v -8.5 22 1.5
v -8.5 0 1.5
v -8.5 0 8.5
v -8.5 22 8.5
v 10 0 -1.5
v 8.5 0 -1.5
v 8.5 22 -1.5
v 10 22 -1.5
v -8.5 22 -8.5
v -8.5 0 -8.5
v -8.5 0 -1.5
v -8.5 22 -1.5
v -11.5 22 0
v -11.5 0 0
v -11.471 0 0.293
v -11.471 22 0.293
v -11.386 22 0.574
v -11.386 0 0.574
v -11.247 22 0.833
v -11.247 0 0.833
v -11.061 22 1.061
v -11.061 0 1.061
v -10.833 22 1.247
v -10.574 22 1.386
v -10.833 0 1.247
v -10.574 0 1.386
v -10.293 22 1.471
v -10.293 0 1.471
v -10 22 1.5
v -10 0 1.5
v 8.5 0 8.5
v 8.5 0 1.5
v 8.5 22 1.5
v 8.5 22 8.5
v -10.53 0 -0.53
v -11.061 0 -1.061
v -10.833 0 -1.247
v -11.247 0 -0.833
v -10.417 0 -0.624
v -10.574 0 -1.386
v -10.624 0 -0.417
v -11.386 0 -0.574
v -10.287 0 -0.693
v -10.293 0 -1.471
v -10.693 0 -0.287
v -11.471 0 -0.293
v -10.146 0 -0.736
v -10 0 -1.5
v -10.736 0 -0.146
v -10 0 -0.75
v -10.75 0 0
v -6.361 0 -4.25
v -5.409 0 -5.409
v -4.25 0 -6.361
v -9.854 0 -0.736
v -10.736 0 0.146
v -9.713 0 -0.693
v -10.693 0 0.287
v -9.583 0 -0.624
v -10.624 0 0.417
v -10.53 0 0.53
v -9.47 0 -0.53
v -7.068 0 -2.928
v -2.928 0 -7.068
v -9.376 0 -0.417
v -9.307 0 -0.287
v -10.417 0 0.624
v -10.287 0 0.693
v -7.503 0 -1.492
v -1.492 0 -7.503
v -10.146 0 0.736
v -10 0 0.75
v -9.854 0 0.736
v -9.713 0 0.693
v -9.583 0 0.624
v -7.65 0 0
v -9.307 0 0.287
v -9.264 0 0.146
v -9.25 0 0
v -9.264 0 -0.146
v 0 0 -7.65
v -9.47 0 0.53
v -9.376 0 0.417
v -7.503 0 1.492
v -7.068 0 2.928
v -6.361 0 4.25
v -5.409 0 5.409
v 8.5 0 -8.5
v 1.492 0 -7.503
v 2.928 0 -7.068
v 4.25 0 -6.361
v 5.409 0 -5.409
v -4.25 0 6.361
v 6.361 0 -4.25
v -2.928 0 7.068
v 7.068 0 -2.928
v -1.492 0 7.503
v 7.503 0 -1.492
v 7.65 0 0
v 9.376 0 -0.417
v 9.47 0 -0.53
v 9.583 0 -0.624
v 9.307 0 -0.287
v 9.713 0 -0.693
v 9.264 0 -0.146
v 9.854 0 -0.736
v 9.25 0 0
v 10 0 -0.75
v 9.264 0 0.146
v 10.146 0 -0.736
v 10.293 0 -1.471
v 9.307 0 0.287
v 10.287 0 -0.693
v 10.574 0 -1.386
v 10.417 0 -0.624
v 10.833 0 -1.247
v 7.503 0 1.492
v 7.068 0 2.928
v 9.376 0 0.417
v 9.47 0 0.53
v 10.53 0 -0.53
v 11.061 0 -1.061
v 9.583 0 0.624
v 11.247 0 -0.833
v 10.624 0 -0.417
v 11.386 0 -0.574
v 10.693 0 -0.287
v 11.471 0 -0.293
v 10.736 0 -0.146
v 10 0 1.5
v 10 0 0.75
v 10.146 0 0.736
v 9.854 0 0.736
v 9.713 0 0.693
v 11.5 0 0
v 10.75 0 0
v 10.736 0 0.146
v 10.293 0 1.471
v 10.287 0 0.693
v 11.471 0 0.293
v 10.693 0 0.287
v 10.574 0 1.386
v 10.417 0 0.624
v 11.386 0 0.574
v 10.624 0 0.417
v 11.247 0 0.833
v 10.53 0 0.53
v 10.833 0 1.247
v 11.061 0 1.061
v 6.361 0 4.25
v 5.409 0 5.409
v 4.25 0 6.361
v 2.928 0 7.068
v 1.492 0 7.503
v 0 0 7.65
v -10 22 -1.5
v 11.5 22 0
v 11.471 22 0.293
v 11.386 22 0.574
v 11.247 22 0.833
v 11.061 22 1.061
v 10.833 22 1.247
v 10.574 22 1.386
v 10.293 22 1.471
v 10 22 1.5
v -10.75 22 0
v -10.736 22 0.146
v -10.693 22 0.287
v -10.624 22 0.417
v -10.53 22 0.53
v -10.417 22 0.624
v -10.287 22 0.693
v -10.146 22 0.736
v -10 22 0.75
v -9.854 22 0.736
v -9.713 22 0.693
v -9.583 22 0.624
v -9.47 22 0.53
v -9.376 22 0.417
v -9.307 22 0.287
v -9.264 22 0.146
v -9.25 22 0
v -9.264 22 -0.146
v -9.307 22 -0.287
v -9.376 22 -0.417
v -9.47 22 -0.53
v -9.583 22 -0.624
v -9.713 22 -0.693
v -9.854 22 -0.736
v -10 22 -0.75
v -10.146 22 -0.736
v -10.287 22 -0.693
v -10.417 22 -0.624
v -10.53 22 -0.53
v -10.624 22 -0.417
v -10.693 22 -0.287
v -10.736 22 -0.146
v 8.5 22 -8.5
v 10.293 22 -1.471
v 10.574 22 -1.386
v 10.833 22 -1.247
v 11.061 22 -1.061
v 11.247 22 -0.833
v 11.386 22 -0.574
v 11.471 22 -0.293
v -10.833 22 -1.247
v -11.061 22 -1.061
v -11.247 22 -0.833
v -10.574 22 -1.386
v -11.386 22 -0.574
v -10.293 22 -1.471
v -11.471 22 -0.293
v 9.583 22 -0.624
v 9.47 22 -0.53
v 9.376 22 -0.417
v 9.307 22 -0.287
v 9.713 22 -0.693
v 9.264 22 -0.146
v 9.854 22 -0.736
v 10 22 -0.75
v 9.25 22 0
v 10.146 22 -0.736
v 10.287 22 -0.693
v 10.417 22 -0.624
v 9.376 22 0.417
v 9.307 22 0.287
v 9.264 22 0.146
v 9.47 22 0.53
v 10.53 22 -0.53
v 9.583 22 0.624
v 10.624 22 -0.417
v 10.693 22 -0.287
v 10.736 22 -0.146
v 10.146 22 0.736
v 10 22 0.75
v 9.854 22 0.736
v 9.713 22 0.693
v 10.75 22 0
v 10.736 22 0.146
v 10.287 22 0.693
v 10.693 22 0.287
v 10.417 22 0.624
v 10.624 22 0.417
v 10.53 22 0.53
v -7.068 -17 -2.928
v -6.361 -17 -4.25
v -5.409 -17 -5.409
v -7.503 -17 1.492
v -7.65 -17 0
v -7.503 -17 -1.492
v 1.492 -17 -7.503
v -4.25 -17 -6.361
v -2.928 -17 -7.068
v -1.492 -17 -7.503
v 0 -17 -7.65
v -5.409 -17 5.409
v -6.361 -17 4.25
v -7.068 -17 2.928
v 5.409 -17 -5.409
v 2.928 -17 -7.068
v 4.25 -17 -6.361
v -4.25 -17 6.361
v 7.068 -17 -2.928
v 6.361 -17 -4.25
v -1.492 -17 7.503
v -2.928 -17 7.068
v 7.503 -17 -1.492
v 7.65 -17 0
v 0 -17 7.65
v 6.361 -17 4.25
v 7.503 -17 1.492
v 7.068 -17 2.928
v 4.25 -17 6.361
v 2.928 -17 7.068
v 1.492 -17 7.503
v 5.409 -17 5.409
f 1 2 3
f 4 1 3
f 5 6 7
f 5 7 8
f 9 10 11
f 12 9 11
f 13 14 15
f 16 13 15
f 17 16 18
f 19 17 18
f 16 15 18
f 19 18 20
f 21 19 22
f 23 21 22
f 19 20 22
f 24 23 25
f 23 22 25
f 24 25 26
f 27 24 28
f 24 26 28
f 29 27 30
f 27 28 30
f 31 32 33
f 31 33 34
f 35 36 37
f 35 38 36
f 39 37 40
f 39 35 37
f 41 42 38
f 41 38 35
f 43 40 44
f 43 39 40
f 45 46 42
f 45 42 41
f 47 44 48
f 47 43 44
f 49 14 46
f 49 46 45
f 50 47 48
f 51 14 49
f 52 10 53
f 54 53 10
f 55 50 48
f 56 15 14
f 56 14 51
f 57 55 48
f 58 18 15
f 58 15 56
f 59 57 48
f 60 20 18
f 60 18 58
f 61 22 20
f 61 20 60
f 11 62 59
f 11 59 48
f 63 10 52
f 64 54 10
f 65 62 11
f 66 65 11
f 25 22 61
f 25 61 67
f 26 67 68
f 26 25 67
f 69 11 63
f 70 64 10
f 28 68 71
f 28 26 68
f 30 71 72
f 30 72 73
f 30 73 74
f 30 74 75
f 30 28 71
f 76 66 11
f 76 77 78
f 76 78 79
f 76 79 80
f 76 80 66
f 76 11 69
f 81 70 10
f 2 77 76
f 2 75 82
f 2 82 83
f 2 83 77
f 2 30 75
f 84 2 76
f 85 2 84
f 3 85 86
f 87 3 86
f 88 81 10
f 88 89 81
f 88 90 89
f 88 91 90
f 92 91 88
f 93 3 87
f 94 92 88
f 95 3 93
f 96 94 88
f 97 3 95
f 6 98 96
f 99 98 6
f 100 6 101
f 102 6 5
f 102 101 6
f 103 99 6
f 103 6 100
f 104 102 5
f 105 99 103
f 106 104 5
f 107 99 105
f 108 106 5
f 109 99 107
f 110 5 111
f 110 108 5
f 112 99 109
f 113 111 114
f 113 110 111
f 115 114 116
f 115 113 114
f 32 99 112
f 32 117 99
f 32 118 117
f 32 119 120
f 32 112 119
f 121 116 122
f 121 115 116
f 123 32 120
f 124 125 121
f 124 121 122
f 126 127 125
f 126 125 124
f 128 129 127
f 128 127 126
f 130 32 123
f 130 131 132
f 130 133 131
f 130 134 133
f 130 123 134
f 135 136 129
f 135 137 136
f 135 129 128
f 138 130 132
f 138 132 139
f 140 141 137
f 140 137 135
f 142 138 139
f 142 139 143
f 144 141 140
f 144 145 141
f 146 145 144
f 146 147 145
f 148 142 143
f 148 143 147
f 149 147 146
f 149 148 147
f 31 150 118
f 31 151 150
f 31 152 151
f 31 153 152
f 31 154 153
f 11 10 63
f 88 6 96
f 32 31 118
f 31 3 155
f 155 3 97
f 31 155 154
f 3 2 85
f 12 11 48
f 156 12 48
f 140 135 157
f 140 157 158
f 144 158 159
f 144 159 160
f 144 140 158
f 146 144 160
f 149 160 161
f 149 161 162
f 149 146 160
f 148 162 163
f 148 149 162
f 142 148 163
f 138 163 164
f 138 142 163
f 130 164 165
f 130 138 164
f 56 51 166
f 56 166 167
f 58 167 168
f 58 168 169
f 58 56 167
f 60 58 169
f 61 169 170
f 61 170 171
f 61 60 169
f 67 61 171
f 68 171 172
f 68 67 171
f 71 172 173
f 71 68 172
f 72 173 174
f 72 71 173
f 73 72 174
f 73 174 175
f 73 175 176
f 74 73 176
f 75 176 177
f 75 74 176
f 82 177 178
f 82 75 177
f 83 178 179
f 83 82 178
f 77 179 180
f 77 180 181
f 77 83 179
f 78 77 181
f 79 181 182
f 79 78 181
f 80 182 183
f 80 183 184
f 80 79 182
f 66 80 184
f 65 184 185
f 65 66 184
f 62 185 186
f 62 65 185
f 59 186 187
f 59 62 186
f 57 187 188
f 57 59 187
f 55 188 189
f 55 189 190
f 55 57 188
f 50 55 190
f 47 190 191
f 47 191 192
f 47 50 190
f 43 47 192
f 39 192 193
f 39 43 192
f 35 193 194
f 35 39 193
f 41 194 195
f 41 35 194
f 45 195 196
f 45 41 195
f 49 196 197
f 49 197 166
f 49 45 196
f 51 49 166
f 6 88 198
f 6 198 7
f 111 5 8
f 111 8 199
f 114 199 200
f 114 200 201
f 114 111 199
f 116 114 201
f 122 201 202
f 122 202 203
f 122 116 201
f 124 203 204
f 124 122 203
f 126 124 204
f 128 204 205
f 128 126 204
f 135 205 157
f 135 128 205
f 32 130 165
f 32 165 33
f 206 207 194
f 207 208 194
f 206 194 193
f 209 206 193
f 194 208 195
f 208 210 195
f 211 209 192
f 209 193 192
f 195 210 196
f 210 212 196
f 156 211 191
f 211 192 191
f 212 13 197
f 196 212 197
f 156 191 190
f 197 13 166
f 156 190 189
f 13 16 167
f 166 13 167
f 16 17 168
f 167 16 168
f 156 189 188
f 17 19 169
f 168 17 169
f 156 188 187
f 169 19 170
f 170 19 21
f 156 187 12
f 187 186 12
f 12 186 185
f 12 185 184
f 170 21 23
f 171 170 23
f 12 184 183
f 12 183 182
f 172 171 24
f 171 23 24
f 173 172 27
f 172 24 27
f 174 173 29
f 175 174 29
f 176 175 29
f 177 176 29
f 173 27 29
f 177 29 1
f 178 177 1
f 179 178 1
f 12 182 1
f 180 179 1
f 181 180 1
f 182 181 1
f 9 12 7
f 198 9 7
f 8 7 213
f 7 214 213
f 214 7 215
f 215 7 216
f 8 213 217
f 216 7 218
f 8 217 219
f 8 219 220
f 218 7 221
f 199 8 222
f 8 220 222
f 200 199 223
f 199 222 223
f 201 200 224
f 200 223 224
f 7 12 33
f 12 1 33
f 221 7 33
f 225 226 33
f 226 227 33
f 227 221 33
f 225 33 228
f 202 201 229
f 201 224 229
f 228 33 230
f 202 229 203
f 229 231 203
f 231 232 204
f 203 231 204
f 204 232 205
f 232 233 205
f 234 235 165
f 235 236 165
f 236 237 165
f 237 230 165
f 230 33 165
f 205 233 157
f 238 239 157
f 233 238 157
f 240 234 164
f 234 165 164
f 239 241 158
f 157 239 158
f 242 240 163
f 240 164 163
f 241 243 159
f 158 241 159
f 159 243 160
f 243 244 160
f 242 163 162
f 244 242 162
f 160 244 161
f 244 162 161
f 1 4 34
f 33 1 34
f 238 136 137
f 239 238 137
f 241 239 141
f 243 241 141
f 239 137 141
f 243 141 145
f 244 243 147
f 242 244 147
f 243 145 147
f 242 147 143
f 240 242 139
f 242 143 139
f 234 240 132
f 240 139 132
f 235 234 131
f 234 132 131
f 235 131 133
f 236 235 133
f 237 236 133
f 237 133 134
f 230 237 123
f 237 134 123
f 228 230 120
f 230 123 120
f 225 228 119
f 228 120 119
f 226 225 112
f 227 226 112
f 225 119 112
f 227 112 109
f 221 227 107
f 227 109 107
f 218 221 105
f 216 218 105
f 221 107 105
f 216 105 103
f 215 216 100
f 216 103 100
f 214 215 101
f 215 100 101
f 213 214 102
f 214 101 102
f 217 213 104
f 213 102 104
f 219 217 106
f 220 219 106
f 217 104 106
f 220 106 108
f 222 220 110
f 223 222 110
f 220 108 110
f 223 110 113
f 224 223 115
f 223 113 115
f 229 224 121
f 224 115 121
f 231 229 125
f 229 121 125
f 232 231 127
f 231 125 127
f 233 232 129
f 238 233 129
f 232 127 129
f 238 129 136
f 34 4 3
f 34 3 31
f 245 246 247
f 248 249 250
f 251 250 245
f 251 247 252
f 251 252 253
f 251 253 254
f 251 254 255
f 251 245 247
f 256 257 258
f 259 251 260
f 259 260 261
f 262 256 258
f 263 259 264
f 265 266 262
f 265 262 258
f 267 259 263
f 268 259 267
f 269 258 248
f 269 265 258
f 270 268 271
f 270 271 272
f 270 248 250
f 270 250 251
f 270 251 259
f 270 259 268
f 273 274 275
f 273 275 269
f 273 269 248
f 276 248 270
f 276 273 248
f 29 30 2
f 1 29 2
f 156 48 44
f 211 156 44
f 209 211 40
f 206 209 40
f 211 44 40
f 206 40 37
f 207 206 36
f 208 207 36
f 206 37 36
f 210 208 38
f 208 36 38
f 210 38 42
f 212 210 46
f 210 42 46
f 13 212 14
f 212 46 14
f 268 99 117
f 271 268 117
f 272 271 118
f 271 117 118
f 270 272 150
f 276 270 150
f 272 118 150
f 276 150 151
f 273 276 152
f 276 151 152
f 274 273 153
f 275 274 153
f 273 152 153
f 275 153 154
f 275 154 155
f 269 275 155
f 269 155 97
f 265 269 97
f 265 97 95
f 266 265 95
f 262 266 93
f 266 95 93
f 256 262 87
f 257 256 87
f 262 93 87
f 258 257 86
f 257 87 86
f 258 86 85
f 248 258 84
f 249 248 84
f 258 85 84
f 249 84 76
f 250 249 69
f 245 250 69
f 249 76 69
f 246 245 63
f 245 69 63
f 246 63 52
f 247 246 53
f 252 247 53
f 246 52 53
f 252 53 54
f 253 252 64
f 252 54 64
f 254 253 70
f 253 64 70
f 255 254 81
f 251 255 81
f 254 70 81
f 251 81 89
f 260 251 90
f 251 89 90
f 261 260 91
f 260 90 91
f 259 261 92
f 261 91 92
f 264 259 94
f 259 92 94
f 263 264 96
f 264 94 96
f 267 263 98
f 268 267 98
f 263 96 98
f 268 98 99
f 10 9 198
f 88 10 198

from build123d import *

# Parameters (mm, degrees)
F0_R     = 7.65
F1_DEPTH = 17
F2_W     = 17
F2_H     = 17
F3_DEPTH = 22
F4_R     = 0.75
F5_DEPTH = 22


# Not quite as in the source:
# - a pattern or mirror of a feature is missing from the dataset's text; its kind, count and spacing are read off the source's solid


with BuildPart() as f1:
    # F0 (on Front) → F1 (new body)
    with BuildSketch(Plane.XZ):
        Circle(F0_R)
    extrude(amount=F1_DEPTH)

    # F2 (on Front) → F3 (join)
    with BuildSketch(Plane.XZ):
        Rectangle(F2_W, F2_H)
    extrude(amount=-F3_DEPTH)

    # F4 (on Front) → F5 (join)
    with BuildSketch(Plane.XZ):
        with BuildLine():
            ThreePointArc((10, -1.5), (11.0606601718, -1.0606601718), (11.5, 0))
            ThreePointArc((11.5, 0), (11.0606601718, 1.0606601718), (10, 1.5))
            ThreePointArc((10, 1.5), (8.9393398282, 1.0606601718), (8.5, 0))
            ThreePointArc((8.5, 0), (8.9393398282, -1.0606601718), (10, -1.5))
        make_face()
        with Locations((10, 0)):
            Circle(F4_R, mode=Mode.SUBTRACT)
        with BuildLine():
            ThreePointArc((8.5, 0), (8.9393398282, 1.0606601718), (10, 1.5))
            Line((10, 1.5), (8.5, 1.5))
            Line((8.5, 1.5), (8.5, 0))
        make_face()
        with BuildLine():
            Line((8.5, -1.5), (10, -1.5))
            ThreePointArc((10, -1.5), (8.9393398282, -1.0606601718), (8.5, 0))
            Line((8.5, 0), (8.5, -1.5))
        make_face()
    f5 = extrude(amount=-F5_DEPTH)

    # F5_copies: F5 across plane
    add(f5.mirror(Plane(origin=(0, 0, 0), x_dir=(0, 0, -1), z_dir=(-1, 0, 0))))


solid = f1.part
